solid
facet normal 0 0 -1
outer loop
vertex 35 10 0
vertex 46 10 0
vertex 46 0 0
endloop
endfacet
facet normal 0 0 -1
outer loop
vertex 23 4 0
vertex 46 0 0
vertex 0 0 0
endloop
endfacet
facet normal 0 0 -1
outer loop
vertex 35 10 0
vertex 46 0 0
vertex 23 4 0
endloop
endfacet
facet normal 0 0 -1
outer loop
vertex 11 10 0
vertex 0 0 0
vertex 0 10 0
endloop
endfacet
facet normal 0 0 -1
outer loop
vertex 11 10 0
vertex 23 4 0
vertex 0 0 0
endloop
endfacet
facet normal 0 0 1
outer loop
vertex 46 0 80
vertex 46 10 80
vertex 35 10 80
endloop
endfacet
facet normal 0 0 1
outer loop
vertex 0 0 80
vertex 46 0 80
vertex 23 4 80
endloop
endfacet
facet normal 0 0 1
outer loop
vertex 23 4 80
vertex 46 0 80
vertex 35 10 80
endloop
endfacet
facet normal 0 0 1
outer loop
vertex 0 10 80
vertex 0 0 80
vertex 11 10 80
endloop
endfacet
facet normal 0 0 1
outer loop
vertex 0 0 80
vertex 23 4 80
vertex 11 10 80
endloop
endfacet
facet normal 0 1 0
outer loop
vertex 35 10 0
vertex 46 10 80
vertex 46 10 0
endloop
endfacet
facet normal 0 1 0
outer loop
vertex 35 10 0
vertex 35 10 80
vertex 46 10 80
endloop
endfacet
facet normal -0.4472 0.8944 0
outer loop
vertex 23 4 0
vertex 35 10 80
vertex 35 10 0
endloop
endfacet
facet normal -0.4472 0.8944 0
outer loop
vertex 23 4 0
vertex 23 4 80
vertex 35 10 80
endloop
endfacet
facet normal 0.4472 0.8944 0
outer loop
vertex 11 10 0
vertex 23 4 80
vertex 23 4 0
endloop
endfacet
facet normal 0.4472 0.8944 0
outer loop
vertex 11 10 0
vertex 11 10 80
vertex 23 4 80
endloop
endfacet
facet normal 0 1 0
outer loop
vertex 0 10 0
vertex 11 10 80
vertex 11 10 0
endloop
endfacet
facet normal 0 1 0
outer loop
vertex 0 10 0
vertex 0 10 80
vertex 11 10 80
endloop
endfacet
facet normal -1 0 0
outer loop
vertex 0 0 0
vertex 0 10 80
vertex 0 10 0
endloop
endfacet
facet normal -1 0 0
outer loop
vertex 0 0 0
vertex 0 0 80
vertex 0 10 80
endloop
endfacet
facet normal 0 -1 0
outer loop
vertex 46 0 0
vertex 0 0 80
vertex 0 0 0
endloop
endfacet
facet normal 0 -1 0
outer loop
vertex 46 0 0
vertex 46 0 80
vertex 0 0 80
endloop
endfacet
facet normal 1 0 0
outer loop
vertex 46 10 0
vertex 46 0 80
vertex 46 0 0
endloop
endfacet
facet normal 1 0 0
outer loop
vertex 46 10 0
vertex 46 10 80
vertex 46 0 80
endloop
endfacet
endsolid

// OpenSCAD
$fn = 32;

// ----------------------------------------------------------------------
// V guide rail: vway, 46 mm wide
// ----------------------------------------------------------------------

// --- parameters (mm) ---
rail_w = 46;              // rail width, X
base_t = 10;              // base plate thickness
v_depth = 6;              // V feature depth / height
v_half_w = 12;            // half width of the V at the base face
plate_t = 80;             // rail length, Z (the extrusion height)
fit_tol = 0.02;           // declared fit tolerance (prompt contract)
free_tol = 0.2;           // declared free tolerance (prompt contract)

profile = [[0, 0], [46, 0], [46, 10], [35, 10], [23, 4], [11, 10], [0, 10]];  // primary outline, 7 points, counter clockwise

// --- the one profile operation ---
linear_extrude(height = plate_t) polygon(points = profile);
